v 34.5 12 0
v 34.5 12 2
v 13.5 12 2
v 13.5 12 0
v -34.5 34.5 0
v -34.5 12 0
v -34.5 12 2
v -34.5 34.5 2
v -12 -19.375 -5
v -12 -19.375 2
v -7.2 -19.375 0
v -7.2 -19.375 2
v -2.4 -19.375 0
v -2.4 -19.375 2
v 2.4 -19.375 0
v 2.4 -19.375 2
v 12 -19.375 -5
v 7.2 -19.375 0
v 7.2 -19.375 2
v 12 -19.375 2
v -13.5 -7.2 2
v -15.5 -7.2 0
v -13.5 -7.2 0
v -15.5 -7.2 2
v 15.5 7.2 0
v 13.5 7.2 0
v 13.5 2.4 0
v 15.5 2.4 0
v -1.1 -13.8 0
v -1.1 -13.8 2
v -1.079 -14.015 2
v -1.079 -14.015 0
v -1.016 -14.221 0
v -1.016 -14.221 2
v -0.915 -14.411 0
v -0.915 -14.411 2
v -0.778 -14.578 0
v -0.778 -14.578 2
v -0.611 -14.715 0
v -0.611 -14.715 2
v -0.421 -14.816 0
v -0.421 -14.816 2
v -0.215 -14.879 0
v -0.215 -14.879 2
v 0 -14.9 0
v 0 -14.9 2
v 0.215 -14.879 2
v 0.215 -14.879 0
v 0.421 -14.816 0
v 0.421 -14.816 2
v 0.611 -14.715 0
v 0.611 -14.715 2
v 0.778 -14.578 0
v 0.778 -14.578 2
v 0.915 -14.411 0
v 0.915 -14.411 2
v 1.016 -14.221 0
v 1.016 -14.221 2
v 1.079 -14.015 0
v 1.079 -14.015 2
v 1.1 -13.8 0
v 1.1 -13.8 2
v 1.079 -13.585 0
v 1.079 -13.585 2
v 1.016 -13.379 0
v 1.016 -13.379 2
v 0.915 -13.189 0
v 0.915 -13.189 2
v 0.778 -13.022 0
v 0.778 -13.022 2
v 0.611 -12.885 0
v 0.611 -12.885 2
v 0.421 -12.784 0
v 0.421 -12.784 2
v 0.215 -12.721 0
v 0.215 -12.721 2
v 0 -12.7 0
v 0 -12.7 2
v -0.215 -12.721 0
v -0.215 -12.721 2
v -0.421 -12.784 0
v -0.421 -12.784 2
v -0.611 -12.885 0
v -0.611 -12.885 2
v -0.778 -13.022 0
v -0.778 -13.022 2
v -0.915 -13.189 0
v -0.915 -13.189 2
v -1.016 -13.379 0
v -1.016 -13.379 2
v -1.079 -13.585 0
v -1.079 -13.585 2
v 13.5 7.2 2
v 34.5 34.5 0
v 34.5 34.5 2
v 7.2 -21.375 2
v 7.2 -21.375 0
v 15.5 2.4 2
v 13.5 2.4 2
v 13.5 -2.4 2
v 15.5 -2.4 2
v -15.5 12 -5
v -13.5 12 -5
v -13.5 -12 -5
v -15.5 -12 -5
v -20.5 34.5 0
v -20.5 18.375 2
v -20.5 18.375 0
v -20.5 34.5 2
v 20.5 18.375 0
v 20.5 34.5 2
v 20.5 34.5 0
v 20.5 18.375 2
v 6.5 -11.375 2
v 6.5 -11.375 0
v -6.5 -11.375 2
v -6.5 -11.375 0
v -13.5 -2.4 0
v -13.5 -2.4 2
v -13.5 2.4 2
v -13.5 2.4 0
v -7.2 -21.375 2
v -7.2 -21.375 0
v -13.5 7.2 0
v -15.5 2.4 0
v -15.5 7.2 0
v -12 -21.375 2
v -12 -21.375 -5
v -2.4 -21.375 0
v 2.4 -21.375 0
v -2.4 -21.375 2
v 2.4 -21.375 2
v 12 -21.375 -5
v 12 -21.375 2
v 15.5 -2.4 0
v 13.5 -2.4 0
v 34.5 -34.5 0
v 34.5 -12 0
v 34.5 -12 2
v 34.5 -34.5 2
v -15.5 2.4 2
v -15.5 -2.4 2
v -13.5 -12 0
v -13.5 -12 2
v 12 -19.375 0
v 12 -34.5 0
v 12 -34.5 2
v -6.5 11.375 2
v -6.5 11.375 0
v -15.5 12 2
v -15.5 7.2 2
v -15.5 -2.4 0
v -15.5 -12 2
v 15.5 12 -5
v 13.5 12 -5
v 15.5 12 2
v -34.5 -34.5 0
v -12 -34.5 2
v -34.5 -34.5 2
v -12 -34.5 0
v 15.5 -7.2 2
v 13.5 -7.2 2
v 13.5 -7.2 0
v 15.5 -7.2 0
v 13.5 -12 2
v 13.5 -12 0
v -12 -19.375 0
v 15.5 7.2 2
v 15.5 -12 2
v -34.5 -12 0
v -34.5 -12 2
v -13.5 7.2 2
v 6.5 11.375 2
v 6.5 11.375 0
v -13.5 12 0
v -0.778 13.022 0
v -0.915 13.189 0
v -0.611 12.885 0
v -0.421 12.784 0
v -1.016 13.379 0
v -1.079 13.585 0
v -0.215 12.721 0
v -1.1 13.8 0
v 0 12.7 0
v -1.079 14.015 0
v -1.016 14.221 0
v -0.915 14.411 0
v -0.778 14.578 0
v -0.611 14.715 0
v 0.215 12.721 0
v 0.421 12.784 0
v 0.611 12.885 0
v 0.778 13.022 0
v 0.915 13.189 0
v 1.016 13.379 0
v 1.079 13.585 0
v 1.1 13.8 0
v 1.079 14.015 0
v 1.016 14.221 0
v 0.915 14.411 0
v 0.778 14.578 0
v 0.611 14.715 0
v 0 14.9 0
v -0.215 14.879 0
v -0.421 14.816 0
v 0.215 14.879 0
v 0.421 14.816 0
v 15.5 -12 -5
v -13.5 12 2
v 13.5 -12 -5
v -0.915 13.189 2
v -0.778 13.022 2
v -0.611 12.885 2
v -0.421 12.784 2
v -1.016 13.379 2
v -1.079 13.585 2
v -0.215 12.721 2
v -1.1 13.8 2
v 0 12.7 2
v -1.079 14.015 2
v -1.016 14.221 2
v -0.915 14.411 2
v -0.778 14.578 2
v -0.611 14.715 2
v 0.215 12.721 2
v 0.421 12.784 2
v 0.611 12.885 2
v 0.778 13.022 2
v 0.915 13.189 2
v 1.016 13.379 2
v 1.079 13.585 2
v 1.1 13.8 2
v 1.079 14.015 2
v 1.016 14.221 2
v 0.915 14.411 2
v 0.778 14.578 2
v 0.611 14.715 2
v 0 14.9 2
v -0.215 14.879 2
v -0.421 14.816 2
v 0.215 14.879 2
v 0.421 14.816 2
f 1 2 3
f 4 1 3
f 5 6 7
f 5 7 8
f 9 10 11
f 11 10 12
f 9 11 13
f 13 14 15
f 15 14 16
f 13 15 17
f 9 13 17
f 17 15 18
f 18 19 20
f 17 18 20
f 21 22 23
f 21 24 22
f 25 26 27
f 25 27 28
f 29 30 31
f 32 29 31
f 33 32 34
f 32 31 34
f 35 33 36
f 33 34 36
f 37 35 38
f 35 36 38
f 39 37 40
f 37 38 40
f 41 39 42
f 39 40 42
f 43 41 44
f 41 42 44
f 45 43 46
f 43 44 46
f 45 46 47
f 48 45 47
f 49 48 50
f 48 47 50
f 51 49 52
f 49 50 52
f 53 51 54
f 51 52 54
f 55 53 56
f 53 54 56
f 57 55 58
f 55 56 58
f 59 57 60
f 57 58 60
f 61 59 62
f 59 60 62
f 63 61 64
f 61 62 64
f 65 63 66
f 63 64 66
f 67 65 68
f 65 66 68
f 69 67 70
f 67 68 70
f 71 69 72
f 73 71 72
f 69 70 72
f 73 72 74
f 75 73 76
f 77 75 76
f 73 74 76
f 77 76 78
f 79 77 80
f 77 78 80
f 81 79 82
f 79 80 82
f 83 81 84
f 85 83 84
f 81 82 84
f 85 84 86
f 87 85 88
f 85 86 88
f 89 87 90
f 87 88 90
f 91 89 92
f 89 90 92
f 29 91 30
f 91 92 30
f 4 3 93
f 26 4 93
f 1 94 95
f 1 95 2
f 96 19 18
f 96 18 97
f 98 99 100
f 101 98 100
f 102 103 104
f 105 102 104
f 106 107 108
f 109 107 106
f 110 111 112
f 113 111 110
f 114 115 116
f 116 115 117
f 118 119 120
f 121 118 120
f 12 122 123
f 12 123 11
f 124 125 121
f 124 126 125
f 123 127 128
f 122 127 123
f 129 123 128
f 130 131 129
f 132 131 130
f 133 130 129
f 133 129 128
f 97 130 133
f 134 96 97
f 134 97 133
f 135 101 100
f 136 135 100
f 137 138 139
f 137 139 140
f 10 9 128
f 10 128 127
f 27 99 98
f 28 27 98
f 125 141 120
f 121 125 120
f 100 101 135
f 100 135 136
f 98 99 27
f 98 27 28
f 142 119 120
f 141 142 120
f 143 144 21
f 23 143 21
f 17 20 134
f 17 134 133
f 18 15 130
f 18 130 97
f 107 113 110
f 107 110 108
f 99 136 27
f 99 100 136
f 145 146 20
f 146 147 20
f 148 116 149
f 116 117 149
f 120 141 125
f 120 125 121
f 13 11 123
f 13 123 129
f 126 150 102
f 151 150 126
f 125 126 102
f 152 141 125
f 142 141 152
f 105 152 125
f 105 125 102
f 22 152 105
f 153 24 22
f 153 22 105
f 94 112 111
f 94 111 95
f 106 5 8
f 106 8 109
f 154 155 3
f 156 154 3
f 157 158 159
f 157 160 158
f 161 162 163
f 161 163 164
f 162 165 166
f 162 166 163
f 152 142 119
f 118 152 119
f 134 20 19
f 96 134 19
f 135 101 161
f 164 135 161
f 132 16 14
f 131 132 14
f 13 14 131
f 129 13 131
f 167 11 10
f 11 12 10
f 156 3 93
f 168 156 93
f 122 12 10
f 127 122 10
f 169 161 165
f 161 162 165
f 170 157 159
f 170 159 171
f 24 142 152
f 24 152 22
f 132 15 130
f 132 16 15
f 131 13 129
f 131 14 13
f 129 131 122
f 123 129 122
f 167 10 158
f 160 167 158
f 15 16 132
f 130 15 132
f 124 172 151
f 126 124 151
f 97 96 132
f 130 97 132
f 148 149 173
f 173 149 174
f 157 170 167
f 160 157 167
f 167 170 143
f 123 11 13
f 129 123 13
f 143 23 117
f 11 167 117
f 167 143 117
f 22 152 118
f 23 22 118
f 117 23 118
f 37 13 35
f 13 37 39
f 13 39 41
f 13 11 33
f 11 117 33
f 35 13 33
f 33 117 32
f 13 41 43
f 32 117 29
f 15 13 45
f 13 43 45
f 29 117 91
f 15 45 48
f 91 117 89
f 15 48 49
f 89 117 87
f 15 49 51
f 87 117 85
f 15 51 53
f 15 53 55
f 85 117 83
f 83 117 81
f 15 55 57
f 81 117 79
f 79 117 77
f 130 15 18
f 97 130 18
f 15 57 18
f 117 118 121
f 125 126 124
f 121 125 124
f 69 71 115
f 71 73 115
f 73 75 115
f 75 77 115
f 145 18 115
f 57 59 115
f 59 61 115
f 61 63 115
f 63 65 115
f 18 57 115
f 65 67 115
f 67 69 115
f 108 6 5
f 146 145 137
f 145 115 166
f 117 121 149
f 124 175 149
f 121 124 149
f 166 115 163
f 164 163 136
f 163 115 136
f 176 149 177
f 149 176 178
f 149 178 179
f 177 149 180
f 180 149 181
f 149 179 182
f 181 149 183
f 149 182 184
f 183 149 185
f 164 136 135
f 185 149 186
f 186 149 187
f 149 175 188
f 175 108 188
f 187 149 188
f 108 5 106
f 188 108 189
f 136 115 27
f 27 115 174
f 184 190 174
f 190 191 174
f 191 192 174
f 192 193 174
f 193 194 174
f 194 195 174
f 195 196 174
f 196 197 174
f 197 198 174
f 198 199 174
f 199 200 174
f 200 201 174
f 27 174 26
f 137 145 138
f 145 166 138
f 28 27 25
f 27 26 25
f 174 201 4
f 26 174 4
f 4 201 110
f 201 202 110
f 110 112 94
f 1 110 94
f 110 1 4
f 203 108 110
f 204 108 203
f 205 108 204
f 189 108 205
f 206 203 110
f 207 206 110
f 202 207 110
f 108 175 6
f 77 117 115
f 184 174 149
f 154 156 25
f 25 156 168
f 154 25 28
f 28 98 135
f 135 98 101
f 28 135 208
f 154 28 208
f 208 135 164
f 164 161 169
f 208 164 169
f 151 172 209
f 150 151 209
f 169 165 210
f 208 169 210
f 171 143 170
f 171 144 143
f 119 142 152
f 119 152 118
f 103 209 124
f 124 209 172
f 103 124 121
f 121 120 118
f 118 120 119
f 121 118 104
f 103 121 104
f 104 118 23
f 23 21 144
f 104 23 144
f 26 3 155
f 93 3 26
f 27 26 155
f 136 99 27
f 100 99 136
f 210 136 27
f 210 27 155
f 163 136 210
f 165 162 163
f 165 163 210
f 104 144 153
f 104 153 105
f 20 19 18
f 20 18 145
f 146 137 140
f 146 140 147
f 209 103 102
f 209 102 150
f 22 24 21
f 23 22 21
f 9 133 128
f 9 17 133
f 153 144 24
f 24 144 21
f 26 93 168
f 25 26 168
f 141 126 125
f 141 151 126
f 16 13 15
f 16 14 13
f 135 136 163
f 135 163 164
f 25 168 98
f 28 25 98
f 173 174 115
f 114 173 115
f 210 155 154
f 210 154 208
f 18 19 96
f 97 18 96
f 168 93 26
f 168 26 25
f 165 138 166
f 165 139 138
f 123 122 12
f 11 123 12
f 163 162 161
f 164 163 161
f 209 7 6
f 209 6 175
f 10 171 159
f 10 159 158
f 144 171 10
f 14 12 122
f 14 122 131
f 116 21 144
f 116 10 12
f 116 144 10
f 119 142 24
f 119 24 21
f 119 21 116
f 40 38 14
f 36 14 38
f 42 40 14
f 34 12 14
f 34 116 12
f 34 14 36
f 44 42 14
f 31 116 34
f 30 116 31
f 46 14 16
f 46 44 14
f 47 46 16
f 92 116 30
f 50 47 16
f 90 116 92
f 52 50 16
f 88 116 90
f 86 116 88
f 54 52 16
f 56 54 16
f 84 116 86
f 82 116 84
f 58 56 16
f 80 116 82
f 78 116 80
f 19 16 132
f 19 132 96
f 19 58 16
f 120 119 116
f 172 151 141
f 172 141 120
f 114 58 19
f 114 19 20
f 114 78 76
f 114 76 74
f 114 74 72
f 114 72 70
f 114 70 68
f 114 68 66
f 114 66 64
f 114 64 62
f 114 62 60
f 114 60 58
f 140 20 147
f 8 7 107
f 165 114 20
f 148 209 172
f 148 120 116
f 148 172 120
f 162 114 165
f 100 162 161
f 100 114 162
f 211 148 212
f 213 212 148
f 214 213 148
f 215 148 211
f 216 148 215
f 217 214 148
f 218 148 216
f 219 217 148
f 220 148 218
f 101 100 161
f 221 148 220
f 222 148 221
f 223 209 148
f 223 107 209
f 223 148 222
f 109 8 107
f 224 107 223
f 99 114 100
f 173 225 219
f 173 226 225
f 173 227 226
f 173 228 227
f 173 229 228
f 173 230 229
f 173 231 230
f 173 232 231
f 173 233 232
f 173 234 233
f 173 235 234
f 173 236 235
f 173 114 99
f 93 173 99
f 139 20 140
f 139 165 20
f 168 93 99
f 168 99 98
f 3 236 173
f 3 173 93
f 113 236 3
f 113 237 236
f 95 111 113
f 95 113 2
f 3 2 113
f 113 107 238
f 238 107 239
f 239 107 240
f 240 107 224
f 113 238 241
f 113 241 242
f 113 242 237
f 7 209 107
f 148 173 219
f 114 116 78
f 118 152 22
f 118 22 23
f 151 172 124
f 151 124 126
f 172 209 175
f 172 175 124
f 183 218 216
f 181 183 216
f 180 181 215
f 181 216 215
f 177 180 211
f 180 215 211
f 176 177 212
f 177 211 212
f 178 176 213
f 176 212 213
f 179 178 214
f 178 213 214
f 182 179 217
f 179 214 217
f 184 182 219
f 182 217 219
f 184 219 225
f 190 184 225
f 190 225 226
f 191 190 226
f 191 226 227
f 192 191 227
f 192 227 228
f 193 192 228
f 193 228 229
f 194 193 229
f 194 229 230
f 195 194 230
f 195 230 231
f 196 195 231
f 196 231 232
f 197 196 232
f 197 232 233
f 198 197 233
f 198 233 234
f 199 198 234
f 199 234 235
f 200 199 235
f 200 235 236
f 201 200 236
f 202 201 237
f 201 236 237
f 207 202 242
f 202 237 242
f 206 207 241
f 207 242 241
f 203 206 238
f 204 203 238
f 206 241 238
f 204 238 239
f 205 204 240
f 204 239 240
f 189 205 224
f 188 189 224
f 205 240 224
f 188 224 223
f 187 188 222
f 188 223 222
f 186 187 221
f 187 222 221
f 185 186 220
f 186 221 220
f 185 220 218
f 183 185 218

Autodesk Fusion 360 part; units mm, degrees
sketch "Sketch1" plane through (0, 0, 0) normal (0, 0, 1) x (1, 0, 0) in component "main"
  line L0 (-34.5, 34.5) -> (34.5, 34.5)
  line L1 (34.5, 34.5) -> (34.5, -34.5)
  line L2 (34.5, -34.5) -> (-34.5, -34.5)
  line L3 (-34.5, -34.5) -> (-34.5, 34.5)
  line L4 (-34.5, 34.5) -> (34.5, -34.5) construction
  line L5 (34.5, 34.5) -> (-34.5, -34.5) construction
  line L6 (-6.5, 11.375) -> (6.5, 11.375)
  line L7 (6.5, 11.375) -> (6.5, -11.375)
  line L8 (6.5, -11.375) -> (-6.5, -11.375)
  line L9 (-6.5, -11.375) -> (-6.5, 11.375)
  line L10 (-6.5, 11.375) -> (6.5, -11.375) construction
  line L11 (6.5, 11.375) -> (-6.5, -11.375) construction
  dimension "d8" = 69
  dimension "d9" = 13
  dimension "d10" = 22.75
extrude "Extrude1" add sketch "Sketch1" along normal blind 2 makes body 1 in component "main"
sketch "Sketch2" plane through (0, 0, 2) normal (0, 0, 1) x (-1, 0, 0) in component "main"
  line L0 (-6.5, 11.375) -> (6.5, 11.375)
  line L1 (6.5, 11.375) -> (6.5, -11.375)
  line L2 (6.5, -11.375) -> (-6.5, -11.375)
  line L3 (-6.5, -11.375) -> (-6.5, 11.375)
  line L4 (34.5, 34.5) -> (-34.5, 34.5)
  line L5 (-34.5, 34.5) -> (-34.5, -34.5)
  line L6 (-34.5, -34.5) -> (34.5, -34.5)
  line L7 (34.5, -34.5) -> (34.5, 34.5)
  line L8 (-34.5, -12) -> (-15.5, -12)
  line L9 (-15.5, -12) -> (-15.5, 12)
  line L10 (-15.5, 12) -> (-34.5, 12)
  line L11 (-34.5, 12) -> (-34.5, -12)
  line L12 (34.5, -12) -> (15.5, -12)
  line L13 (15.5, -12) -> (15.5, 12)
  line L14 (15.5, 12) -> (34.5, 12)
  line L15 (34.5, 12) -> (34.5, -12)
  line L16 (12, 34.5) -> (-12, 34.5)
  line L17 (-12, 34.5) -> (-12, 21.375)
  line L18 (-12, 21.375) -> (12, 21.375)
  line L19 (12, 21.375) -> (12, 34.5)
  line L20 (20.5, -34.5) -> (-20.5, -34.5)
  line L21 (-20.5, -34.5) -> (-20.5, -18.375)
  line L22 (-20.5, -18.375) -> (20.5, -18.375)
  line L23 (20.5, -18.375) -> (20.5, -34.5)
  dimension "d13" = 24
  dimension "d17" = 10
  dimension "d18" = 9
  dimension "d19" = 14
  dimension "d20" = 7
extrude "Extrude2" cut sketch "Sketch2" against normal blind 5 contours L4 L16 L17 L18 L19 | L7 L12 L13 L14 L15 | L5 L8 L9 L10 L11 | L6 L20 L21 L22 L23 bodies 1 in component "main"
sketch "Sketch3" plane through (0, 0, 2) normal (0, 0, 1) x (-1, 0, 0) in component "main"
  line L0 (15.5, 12) -> (34.5, 12)
  line L1 (34.5, 12) -> (34.5, 34.5)
  line L2 (34.5, 34.5) -> (12, 34.5)
  line L3 (12, 34.5) -> (12, 21.375)
  line L4 (12, 21.375) -> (-12, 21.375)
  line L5 (-12, 21.375) -> (-12, 34.5)
  line L6 (-12, 34.5) -> (-34.5, 34.5)
  line L7 (-34.5, 34.5) -> (-34.5, 12)
  line L8 (-34.5, 12) -> (-15.5, 12)
  line L9 (-15.5, 12) -> (-15.5, -12)
  line L10 (-15.5, -12) -> (-34.5, -12)
  line L11 (-34.5, -12) -> (-34.5, -34.5)
  line L12 (-34.5, -34.5) -> (-20.5, -34.5)
  line L13 (-20.5, -34.5) -> (-20.5, -18.375)
  line L14 (-20.5, -18.375) -> (20.5, -18.375)
  line L15 (20.5, -18.375) -> (20.5, -34.5)
  line L16 (20.5, -34.5) -> (34.5, -34.5)
  line L17 (34.5, -34.5) -> (34.5, -12)
  line L18 (34.5, -12) -> (15.5, -12)
  line L19 (15.5, -12) -> (15.5, 12)
  line L20 (-6.5, 11.375) -> (6.5, 11.375)
  line L21 (6.5, 11.375) -> (6.5, -11.375)
  line L22 (6.5, -11.375) -> (-6.5, -11.375)
  line L23 (-6.5, -11.375) -> (-6.5, 11.375)
  line L24 (15.5, -12) -> (13.5, -12)
  line L25 (13.5, -12) -> (13.5, -7.2)
  line L26 (13.5, -7.2) -> (15.5, -7.2)
  line L27 (15.5, -7.2) -> (15.5, -12)
  line L28 (13.5, -7.2) -> (15.5, -7.2)
  line L29 (15.5, -7.2) -> (15.5, -2.4)
  line L30 (15.5, -2.4) -> (13.5, -2.4)
  line L31 (13.5, -2.4) -> (13.5, -7.2)
  line L32 (13.5, -2.4) -> (15.5, -2.4)
  line L33 (15.5, -2.4) -> (15.5, 2.4)
  line L34 (15.5, 2.4) -> (13.5, 2.4)
  line L35 (13.5, 2.4) -> (13.5, -2.4)
  line L36 (13.5, 2.4) -> (15.5, 2.4)
  line L37 (15.5, 2.4) -> (15.5, 7.2)
  line L38 (15.5, 7.2) -> (13.5, 7.2)
  line L39 (13.5, 7.2) -> (13.5, 2.4)
  line L40 (13.5, 7.2) -> (15.5, 7.2)
  line L41 (15.5, 7.2) -> (15.5, 12)
  line L42 (15.5, 12) -> (13.5, 12)
  line L43 (13.5, 12) -> (13.5, 7.2)
  line L44 (12, 21.375) -> (7.2, 21.375)
  line L45 (7.2, 21.375) -> (7.2, 19.375)
  line L46 (7.2, 19.375) -> (12, 19.375)
  line L47 (12, 19.375) -> (12, 21.375)
  line L48 (7.2, 19.375) -> (2.4, 19.375)
  line L49 (2.4, 19.375) -> (2.4, 21.375)
  line L50 (2.4, 21.375) -> (7.2, 21.375)
  line L51 (7.2, 21.375) -> (7.2, 19.375)
  line L52 (2.4, 19.375) -> (-2.4, 19.375)
  line L53 (-2.4, 19.375) -> (-2.4, 21.375)
  line L54 (-2.4, 21.375) -> (2.4, 21.375)
  line L55 (2.4, 21.375) -> (2.4, 19.375)
  line L56 (-2.4, 19.375) -> (-7.2, 19.375)
  line L57 (-7.2, 19.375) -> (-7.2, 21.375)
  line L58 (-7.2, 21.375) -> (-2.4, 21.375)
  line L59 (-2.4, 21.375) -> (-2.4, 19.375)
  line L60 (-7.2, 19.375) -> (-12, 19.375)
  line L61 (-12, 19.375) -> (-12, 21.375)
  line L62 (-12, 21.375) -> (-7.2, 21.375)
  line L63 (-7.2, 21.375) -> (-7.2, 19.375)
  line L64 (0, -1.75) -> (0, -22.5)
  line L65 (-13.5, -7.2) -> (-15.5, -7.2)
  line L66 (-13.5, -12) -> (-13.5, -7.2)
  line L67 (-13.5, 7.2) -> (-15.5, 7.2)
  line L68 (-15.5, -2.4) -> (-15.5, 2.4)
  line L69 (-13.5, -2.4) -> (-15.5, -2.4)
  line L70 (-15.5, 7.2) -> (-15.5, 12)
  line L71 (-15.5, -2.4) -> (-13.5, -2.4)
  line L72 (-15.5, -12) -> (-13.5, -12)
  line L73 (-15.5, -7.2) -> (-15.5, -12)
  line L74 (-15.5, 2.4) -> (-13.5, 2.4)
  line L75 (-15.5, 12) -> (-34.5, 12)
  line L76 (-15.5, 7.2) -> (-13.5, 7.2)
  line L77 (-13.5, 2.4) -> (-13.5, -2.4)
  line L78 (-15.5, -7.2) -> (-15.5, -2.4)
  line L79 (-13.5, -2.4) -> (-13.5, -7.2)
  line L80 (-15.5, 12) -> (-13.5, 12)
  line L81 (-13.5, 7.2) -> (-13.5, 2.4)
  line L82 (-15.5, -12) -> (-15.5, 12)
  line L83 (-13.5, -7.2) -> (-15.5, -7.2)
  line L84 (-13.5, 2.4) -> (-15.5, 2.4)
  line L85 (-34.5, -12) -> (-15.5, -12)
  line L86 (-15.5, 2.4) -> (-15.5, 7.2)
  line L87 (-13.5, 12) -> (-13.5, 7.2)
  dimension "d23" = 4.8
  dimension "d24" = 4.8
  dimension "d25" = 4.8
  dimension "d26" = 4.8
  dimension "d27" = 2
  dimension "d28" = 2
  dimension "d29" = 4.8
  dimension "d30" = 4.8
  dimension "d31" = 4.8
  dimension "d32" = 4.8
  dimension "d33" = 4.8
extrude "Extrude3" cut sketch "Sketch3" against normal blind 4 contours L19 L38 L40 L41 L42 L43 | L19 L30 L32 L33 L34 L35 L36 | L4 L44 L45 L46 L47 L51 | L19 L24 L25 L26 L27 L28 | L4 L49 L52 L53 L54 L55 L59 | L4 L57 L60 L61 L62 L63 | L9 L67 L70 L76 L80 L82 L87 | L9 L68 L69 L71 L74 L77 L82 L84 | L9 L65 L66 L72 L73 L82 L83 bodies 1 in component "main"
sketch "Sketch1 (2)" plane through (-13.5, 0, 0) normal (-1, 0, 0) x (0, -1, 0) in component "left slot"
  line L0 (-2.4, 0) -> (2.4, 0)
  line L1 (2.4, 0) -> (2.4, 2)
  line L2 (2.4, 2) -> (-2.4, 2)
  line L3 (-2.4, 2) -> (-2.4, 0)
  line L4 (-12, 2) -> (12, 2)
  line L5 (12, 2) -> (12, -5)
  line L6 (-12, -5) -> (-12, 2)
  line L7 (-12, -5) -> (12, -5)
  point P0 (-12, 2)
  point P1 (12, 2)
  dimension "d36" = 7
extrude "Extrude1'" add sketch "Sketch1 (2)" along normal blind 2 separate body makes body 2 in component "left slot"
extrude "Extrude1''" add 1 faces at (-15.5, 4, -0.3333) along direction (1, 0, 0) blind 2 from surface at 29 separate body on bodies 2 makes body 3 in component "right slot"
sketch "Sketch1 (3)" plane through (0, -19.375, 0) normal (0, -1, 0) x (1, 0, 0) in component "front slot"
  line L0 (-2.4, 0) -> (2.4, 0)
  line L1 (2.4, 0) -> (2.4, 2)
  line L2 (2.4, 2) -> (-2.4, 2)
  line L3 (-2.4, 2) -> (-2.4, 0)
  line L4 (-12, 2) -> (12, 2)
  line L5 (12, 2) -> (12, -5)
  line L6 (12, -5) -> (-12, -5)
  line L7 (-12, -5) -> (-12, 2)
  point P0 (12, 2)
  dimension "d47" = 7
extrude "Extrude1'''" add sketch "Sketch1 (3)" along normal blind 2 separate body makes body 4 in component "front slot"
combine "Combine1" operation cut target body 2 tool bodies 1 keep tools in component "left slot"
combine "Combine1'" operation cut target body 4 tool bodies 1 keep tools in component "front slot"
combine "Combine1''" operation cut target body 3 tool bodies 1 keep tools in component "right slot"
sketch "Sketch4" plane through (0, 0, 2) normal (0, 0, 1) x (-1, 0, 0) in component "main"
  line L0 (-13.5, 7.2) -> (-15.5, 7.2)
  line L1 (-15.5, 7.2) -> (-15.5, 2.4)
  line L2 (-15.5, 2.4) -> (-13.5, 2.4)
  line L3 (-13.5, 2.4) -> (-13.5, -2.4)
  line L4 (-13.5, -2.4) -> (-15.5, -2.4)
  line L5 (-15.5, -2.4) -> (-15.5, -7.2)
  line L6 (-15.5, -7.2) -> (-13.5, -7.2)
  line L7 (-13.5, -7.2) -> (-13.5, -12)
  line L8 (-13.5, -12) -> (-34.5, -12)
  line L9 (-34.5, -12) -> (-34.5, -34.5)
  line L10 (-34.5, -34.5) -> (-20.5, -34.5)
  line L11 (-20.5, -34.5) -> (-20.5, -18.375)
  line L12 (-20.5, -18.375) -> (20.5, -18.375)
  line L13 (20.5, -18.375) -> (20.5, -34.5)
  line L14 (20.5, -34.5) -> (34.5, -34.5)
  line L15 (34.5, -34.5) -> (34.5, -12)
  line L16 (34.5, -12) -> (13.5, -12)
  line L17 (13.5, -12) -> (13.5, -7.2)
  line L18 (13.5, -7.2) -> (15.5, -7.2)
  line L19 (15.5, -7.2) -> (15.5, -2.4)
  line L20 (15.5, -2.4) -> (13.5, -2.4)
  line L21 (13.5, -2.4) -> (13.5, 2.4)
  line L22 (13.5, 2.4) -> (15.5, 2.4)
  line L23 (15.5, 2.4) -> (15.5, 7.2)
  line L24 (15.5, 7.2) -> (13.5, 7.2)
  line L25 (13.5, 7.2) -> (13.5, 12)
  line L26 (13.5, 12) -> (34.5, 12)
  line L27 (34.5, 12) -> (34.5, 34.5)
  line L28 (34.5, 34.5) -> (12, 34.5)
  line L29 (12, 34.5) -> (12, 19.375)
  line L30 (12, 19.375) -> (7.2, 19.375)
  line L31 (7.2, 19.375) -> (7.2, 21.375)
  line L32 (7.2, 21.375) -> (2.4, 21.375)
  line L33 (2.4, 21.375) -> (2.4, 19.375)
  line L34 (2.4, 19.375) -> (-2.4, 19.375)
  line L35 (-2.4, 19.375) -> (-2.4, 21.375)
  line L36 (-2.4, 21.375) -> (-7.2, 21.375)
  line L37 (-7.2, 21.375) -> (-7.2, 19.375)
  line L38 (-7.2, 19.375) -> (-12, 19.375)
  line L39 (-12, 19.375) -> (-12, 34.5)
  line L40 (-12, 34.5) -> (-34.5, 34.5)
  line L41 (-34.5, 34.5) -> (-34.5, 12)
  line L42 (-34.5, 12) -> (-13.5, 12)
  line L43 (-13.5, 12) -> (-13.5, 7.2)
  line L44 (-6.5, 11.375) -> (6.5, 11.375)
  line L45 (6.5, 11.375) -> (6.5, -11.375)
  line L46 (6.5, -11.375) -> (-6.5, -11.375)
  line L47 (-6.5, -11.375) -> (-6.5, 11.375)
  circle A0 centre (0, -13.8) radius 1.1
  line L48 (0, -18.375) -> (0, -11.375) construction
  dimension "d50" = 2.2
  dimension "d51" = 2.425
extrude "Extrude4" cut sketch "Sketch4" against normal blind 6 contours A0 bodies 1 in component "main"
mirror "Mirror1" about plane through (0, 0, 0) normal (0, 1, 0) of "Extrude4" in component "main"
component "main" placed x (1, 0, 0) y (0, 1, 0) z (0, 0, 1) at (0, 0, 0)
component "left slot" placed x (1, 0, 0) y (0, 1, 0) z (0, 0, 1) at (0, 0, 0)
component "right slot" placed x (1, 0, 0) y (0, 1, 0) z (0, 0, 1) at (0, 0, 0)
component "front slot" placed x (1, 0, 0) y (0, 1, 0) z (0, 0, 1) at (0, 0, 0)
equation "Sides = 69 mm"
equation "servolength = 22.75 mm"
equation "servowidth = 13 mm"
equation "thick = 2 mm"
equation "spoutwidth = 30 mm"
equation "servotab = 5 mm"
equation "d8 = Sides"
equation "d9 = servowidth"
equation "d10 = servolength"
equation "d11 = thick"
equation "d13 = slotlength"
equation "spouthole = 15 mm"
equation "offset = 9 mm"
equation "d18 = offset"
equation "d19 = offset + 5 mm"
equation "d20 = servotab + thick"
equation "d23 = slotlength / 5"
equation "d24 = slotlength / 5"
equation "d25 = slotlength / 5"
equation "d26 = slotlength / 5"
equation "d27 = thick"
equation "d28 = thick"
equation "d29 = slotlength / 5"
equation "d30 = slotlength / 5"
equation "d31 = slotlength / 5"
equation "d32 = slotlength / 5"
equation "d33 = slotlength / 5"
equation "d36 = 5 mm + thick"
equation "slotlength = 24 mm"
equation "d39 = thick"
equation "d47 = 5 mm + thick"
equation "d48 = thick"
equation "d51 = 1.325 mm + 1.1 mm"
